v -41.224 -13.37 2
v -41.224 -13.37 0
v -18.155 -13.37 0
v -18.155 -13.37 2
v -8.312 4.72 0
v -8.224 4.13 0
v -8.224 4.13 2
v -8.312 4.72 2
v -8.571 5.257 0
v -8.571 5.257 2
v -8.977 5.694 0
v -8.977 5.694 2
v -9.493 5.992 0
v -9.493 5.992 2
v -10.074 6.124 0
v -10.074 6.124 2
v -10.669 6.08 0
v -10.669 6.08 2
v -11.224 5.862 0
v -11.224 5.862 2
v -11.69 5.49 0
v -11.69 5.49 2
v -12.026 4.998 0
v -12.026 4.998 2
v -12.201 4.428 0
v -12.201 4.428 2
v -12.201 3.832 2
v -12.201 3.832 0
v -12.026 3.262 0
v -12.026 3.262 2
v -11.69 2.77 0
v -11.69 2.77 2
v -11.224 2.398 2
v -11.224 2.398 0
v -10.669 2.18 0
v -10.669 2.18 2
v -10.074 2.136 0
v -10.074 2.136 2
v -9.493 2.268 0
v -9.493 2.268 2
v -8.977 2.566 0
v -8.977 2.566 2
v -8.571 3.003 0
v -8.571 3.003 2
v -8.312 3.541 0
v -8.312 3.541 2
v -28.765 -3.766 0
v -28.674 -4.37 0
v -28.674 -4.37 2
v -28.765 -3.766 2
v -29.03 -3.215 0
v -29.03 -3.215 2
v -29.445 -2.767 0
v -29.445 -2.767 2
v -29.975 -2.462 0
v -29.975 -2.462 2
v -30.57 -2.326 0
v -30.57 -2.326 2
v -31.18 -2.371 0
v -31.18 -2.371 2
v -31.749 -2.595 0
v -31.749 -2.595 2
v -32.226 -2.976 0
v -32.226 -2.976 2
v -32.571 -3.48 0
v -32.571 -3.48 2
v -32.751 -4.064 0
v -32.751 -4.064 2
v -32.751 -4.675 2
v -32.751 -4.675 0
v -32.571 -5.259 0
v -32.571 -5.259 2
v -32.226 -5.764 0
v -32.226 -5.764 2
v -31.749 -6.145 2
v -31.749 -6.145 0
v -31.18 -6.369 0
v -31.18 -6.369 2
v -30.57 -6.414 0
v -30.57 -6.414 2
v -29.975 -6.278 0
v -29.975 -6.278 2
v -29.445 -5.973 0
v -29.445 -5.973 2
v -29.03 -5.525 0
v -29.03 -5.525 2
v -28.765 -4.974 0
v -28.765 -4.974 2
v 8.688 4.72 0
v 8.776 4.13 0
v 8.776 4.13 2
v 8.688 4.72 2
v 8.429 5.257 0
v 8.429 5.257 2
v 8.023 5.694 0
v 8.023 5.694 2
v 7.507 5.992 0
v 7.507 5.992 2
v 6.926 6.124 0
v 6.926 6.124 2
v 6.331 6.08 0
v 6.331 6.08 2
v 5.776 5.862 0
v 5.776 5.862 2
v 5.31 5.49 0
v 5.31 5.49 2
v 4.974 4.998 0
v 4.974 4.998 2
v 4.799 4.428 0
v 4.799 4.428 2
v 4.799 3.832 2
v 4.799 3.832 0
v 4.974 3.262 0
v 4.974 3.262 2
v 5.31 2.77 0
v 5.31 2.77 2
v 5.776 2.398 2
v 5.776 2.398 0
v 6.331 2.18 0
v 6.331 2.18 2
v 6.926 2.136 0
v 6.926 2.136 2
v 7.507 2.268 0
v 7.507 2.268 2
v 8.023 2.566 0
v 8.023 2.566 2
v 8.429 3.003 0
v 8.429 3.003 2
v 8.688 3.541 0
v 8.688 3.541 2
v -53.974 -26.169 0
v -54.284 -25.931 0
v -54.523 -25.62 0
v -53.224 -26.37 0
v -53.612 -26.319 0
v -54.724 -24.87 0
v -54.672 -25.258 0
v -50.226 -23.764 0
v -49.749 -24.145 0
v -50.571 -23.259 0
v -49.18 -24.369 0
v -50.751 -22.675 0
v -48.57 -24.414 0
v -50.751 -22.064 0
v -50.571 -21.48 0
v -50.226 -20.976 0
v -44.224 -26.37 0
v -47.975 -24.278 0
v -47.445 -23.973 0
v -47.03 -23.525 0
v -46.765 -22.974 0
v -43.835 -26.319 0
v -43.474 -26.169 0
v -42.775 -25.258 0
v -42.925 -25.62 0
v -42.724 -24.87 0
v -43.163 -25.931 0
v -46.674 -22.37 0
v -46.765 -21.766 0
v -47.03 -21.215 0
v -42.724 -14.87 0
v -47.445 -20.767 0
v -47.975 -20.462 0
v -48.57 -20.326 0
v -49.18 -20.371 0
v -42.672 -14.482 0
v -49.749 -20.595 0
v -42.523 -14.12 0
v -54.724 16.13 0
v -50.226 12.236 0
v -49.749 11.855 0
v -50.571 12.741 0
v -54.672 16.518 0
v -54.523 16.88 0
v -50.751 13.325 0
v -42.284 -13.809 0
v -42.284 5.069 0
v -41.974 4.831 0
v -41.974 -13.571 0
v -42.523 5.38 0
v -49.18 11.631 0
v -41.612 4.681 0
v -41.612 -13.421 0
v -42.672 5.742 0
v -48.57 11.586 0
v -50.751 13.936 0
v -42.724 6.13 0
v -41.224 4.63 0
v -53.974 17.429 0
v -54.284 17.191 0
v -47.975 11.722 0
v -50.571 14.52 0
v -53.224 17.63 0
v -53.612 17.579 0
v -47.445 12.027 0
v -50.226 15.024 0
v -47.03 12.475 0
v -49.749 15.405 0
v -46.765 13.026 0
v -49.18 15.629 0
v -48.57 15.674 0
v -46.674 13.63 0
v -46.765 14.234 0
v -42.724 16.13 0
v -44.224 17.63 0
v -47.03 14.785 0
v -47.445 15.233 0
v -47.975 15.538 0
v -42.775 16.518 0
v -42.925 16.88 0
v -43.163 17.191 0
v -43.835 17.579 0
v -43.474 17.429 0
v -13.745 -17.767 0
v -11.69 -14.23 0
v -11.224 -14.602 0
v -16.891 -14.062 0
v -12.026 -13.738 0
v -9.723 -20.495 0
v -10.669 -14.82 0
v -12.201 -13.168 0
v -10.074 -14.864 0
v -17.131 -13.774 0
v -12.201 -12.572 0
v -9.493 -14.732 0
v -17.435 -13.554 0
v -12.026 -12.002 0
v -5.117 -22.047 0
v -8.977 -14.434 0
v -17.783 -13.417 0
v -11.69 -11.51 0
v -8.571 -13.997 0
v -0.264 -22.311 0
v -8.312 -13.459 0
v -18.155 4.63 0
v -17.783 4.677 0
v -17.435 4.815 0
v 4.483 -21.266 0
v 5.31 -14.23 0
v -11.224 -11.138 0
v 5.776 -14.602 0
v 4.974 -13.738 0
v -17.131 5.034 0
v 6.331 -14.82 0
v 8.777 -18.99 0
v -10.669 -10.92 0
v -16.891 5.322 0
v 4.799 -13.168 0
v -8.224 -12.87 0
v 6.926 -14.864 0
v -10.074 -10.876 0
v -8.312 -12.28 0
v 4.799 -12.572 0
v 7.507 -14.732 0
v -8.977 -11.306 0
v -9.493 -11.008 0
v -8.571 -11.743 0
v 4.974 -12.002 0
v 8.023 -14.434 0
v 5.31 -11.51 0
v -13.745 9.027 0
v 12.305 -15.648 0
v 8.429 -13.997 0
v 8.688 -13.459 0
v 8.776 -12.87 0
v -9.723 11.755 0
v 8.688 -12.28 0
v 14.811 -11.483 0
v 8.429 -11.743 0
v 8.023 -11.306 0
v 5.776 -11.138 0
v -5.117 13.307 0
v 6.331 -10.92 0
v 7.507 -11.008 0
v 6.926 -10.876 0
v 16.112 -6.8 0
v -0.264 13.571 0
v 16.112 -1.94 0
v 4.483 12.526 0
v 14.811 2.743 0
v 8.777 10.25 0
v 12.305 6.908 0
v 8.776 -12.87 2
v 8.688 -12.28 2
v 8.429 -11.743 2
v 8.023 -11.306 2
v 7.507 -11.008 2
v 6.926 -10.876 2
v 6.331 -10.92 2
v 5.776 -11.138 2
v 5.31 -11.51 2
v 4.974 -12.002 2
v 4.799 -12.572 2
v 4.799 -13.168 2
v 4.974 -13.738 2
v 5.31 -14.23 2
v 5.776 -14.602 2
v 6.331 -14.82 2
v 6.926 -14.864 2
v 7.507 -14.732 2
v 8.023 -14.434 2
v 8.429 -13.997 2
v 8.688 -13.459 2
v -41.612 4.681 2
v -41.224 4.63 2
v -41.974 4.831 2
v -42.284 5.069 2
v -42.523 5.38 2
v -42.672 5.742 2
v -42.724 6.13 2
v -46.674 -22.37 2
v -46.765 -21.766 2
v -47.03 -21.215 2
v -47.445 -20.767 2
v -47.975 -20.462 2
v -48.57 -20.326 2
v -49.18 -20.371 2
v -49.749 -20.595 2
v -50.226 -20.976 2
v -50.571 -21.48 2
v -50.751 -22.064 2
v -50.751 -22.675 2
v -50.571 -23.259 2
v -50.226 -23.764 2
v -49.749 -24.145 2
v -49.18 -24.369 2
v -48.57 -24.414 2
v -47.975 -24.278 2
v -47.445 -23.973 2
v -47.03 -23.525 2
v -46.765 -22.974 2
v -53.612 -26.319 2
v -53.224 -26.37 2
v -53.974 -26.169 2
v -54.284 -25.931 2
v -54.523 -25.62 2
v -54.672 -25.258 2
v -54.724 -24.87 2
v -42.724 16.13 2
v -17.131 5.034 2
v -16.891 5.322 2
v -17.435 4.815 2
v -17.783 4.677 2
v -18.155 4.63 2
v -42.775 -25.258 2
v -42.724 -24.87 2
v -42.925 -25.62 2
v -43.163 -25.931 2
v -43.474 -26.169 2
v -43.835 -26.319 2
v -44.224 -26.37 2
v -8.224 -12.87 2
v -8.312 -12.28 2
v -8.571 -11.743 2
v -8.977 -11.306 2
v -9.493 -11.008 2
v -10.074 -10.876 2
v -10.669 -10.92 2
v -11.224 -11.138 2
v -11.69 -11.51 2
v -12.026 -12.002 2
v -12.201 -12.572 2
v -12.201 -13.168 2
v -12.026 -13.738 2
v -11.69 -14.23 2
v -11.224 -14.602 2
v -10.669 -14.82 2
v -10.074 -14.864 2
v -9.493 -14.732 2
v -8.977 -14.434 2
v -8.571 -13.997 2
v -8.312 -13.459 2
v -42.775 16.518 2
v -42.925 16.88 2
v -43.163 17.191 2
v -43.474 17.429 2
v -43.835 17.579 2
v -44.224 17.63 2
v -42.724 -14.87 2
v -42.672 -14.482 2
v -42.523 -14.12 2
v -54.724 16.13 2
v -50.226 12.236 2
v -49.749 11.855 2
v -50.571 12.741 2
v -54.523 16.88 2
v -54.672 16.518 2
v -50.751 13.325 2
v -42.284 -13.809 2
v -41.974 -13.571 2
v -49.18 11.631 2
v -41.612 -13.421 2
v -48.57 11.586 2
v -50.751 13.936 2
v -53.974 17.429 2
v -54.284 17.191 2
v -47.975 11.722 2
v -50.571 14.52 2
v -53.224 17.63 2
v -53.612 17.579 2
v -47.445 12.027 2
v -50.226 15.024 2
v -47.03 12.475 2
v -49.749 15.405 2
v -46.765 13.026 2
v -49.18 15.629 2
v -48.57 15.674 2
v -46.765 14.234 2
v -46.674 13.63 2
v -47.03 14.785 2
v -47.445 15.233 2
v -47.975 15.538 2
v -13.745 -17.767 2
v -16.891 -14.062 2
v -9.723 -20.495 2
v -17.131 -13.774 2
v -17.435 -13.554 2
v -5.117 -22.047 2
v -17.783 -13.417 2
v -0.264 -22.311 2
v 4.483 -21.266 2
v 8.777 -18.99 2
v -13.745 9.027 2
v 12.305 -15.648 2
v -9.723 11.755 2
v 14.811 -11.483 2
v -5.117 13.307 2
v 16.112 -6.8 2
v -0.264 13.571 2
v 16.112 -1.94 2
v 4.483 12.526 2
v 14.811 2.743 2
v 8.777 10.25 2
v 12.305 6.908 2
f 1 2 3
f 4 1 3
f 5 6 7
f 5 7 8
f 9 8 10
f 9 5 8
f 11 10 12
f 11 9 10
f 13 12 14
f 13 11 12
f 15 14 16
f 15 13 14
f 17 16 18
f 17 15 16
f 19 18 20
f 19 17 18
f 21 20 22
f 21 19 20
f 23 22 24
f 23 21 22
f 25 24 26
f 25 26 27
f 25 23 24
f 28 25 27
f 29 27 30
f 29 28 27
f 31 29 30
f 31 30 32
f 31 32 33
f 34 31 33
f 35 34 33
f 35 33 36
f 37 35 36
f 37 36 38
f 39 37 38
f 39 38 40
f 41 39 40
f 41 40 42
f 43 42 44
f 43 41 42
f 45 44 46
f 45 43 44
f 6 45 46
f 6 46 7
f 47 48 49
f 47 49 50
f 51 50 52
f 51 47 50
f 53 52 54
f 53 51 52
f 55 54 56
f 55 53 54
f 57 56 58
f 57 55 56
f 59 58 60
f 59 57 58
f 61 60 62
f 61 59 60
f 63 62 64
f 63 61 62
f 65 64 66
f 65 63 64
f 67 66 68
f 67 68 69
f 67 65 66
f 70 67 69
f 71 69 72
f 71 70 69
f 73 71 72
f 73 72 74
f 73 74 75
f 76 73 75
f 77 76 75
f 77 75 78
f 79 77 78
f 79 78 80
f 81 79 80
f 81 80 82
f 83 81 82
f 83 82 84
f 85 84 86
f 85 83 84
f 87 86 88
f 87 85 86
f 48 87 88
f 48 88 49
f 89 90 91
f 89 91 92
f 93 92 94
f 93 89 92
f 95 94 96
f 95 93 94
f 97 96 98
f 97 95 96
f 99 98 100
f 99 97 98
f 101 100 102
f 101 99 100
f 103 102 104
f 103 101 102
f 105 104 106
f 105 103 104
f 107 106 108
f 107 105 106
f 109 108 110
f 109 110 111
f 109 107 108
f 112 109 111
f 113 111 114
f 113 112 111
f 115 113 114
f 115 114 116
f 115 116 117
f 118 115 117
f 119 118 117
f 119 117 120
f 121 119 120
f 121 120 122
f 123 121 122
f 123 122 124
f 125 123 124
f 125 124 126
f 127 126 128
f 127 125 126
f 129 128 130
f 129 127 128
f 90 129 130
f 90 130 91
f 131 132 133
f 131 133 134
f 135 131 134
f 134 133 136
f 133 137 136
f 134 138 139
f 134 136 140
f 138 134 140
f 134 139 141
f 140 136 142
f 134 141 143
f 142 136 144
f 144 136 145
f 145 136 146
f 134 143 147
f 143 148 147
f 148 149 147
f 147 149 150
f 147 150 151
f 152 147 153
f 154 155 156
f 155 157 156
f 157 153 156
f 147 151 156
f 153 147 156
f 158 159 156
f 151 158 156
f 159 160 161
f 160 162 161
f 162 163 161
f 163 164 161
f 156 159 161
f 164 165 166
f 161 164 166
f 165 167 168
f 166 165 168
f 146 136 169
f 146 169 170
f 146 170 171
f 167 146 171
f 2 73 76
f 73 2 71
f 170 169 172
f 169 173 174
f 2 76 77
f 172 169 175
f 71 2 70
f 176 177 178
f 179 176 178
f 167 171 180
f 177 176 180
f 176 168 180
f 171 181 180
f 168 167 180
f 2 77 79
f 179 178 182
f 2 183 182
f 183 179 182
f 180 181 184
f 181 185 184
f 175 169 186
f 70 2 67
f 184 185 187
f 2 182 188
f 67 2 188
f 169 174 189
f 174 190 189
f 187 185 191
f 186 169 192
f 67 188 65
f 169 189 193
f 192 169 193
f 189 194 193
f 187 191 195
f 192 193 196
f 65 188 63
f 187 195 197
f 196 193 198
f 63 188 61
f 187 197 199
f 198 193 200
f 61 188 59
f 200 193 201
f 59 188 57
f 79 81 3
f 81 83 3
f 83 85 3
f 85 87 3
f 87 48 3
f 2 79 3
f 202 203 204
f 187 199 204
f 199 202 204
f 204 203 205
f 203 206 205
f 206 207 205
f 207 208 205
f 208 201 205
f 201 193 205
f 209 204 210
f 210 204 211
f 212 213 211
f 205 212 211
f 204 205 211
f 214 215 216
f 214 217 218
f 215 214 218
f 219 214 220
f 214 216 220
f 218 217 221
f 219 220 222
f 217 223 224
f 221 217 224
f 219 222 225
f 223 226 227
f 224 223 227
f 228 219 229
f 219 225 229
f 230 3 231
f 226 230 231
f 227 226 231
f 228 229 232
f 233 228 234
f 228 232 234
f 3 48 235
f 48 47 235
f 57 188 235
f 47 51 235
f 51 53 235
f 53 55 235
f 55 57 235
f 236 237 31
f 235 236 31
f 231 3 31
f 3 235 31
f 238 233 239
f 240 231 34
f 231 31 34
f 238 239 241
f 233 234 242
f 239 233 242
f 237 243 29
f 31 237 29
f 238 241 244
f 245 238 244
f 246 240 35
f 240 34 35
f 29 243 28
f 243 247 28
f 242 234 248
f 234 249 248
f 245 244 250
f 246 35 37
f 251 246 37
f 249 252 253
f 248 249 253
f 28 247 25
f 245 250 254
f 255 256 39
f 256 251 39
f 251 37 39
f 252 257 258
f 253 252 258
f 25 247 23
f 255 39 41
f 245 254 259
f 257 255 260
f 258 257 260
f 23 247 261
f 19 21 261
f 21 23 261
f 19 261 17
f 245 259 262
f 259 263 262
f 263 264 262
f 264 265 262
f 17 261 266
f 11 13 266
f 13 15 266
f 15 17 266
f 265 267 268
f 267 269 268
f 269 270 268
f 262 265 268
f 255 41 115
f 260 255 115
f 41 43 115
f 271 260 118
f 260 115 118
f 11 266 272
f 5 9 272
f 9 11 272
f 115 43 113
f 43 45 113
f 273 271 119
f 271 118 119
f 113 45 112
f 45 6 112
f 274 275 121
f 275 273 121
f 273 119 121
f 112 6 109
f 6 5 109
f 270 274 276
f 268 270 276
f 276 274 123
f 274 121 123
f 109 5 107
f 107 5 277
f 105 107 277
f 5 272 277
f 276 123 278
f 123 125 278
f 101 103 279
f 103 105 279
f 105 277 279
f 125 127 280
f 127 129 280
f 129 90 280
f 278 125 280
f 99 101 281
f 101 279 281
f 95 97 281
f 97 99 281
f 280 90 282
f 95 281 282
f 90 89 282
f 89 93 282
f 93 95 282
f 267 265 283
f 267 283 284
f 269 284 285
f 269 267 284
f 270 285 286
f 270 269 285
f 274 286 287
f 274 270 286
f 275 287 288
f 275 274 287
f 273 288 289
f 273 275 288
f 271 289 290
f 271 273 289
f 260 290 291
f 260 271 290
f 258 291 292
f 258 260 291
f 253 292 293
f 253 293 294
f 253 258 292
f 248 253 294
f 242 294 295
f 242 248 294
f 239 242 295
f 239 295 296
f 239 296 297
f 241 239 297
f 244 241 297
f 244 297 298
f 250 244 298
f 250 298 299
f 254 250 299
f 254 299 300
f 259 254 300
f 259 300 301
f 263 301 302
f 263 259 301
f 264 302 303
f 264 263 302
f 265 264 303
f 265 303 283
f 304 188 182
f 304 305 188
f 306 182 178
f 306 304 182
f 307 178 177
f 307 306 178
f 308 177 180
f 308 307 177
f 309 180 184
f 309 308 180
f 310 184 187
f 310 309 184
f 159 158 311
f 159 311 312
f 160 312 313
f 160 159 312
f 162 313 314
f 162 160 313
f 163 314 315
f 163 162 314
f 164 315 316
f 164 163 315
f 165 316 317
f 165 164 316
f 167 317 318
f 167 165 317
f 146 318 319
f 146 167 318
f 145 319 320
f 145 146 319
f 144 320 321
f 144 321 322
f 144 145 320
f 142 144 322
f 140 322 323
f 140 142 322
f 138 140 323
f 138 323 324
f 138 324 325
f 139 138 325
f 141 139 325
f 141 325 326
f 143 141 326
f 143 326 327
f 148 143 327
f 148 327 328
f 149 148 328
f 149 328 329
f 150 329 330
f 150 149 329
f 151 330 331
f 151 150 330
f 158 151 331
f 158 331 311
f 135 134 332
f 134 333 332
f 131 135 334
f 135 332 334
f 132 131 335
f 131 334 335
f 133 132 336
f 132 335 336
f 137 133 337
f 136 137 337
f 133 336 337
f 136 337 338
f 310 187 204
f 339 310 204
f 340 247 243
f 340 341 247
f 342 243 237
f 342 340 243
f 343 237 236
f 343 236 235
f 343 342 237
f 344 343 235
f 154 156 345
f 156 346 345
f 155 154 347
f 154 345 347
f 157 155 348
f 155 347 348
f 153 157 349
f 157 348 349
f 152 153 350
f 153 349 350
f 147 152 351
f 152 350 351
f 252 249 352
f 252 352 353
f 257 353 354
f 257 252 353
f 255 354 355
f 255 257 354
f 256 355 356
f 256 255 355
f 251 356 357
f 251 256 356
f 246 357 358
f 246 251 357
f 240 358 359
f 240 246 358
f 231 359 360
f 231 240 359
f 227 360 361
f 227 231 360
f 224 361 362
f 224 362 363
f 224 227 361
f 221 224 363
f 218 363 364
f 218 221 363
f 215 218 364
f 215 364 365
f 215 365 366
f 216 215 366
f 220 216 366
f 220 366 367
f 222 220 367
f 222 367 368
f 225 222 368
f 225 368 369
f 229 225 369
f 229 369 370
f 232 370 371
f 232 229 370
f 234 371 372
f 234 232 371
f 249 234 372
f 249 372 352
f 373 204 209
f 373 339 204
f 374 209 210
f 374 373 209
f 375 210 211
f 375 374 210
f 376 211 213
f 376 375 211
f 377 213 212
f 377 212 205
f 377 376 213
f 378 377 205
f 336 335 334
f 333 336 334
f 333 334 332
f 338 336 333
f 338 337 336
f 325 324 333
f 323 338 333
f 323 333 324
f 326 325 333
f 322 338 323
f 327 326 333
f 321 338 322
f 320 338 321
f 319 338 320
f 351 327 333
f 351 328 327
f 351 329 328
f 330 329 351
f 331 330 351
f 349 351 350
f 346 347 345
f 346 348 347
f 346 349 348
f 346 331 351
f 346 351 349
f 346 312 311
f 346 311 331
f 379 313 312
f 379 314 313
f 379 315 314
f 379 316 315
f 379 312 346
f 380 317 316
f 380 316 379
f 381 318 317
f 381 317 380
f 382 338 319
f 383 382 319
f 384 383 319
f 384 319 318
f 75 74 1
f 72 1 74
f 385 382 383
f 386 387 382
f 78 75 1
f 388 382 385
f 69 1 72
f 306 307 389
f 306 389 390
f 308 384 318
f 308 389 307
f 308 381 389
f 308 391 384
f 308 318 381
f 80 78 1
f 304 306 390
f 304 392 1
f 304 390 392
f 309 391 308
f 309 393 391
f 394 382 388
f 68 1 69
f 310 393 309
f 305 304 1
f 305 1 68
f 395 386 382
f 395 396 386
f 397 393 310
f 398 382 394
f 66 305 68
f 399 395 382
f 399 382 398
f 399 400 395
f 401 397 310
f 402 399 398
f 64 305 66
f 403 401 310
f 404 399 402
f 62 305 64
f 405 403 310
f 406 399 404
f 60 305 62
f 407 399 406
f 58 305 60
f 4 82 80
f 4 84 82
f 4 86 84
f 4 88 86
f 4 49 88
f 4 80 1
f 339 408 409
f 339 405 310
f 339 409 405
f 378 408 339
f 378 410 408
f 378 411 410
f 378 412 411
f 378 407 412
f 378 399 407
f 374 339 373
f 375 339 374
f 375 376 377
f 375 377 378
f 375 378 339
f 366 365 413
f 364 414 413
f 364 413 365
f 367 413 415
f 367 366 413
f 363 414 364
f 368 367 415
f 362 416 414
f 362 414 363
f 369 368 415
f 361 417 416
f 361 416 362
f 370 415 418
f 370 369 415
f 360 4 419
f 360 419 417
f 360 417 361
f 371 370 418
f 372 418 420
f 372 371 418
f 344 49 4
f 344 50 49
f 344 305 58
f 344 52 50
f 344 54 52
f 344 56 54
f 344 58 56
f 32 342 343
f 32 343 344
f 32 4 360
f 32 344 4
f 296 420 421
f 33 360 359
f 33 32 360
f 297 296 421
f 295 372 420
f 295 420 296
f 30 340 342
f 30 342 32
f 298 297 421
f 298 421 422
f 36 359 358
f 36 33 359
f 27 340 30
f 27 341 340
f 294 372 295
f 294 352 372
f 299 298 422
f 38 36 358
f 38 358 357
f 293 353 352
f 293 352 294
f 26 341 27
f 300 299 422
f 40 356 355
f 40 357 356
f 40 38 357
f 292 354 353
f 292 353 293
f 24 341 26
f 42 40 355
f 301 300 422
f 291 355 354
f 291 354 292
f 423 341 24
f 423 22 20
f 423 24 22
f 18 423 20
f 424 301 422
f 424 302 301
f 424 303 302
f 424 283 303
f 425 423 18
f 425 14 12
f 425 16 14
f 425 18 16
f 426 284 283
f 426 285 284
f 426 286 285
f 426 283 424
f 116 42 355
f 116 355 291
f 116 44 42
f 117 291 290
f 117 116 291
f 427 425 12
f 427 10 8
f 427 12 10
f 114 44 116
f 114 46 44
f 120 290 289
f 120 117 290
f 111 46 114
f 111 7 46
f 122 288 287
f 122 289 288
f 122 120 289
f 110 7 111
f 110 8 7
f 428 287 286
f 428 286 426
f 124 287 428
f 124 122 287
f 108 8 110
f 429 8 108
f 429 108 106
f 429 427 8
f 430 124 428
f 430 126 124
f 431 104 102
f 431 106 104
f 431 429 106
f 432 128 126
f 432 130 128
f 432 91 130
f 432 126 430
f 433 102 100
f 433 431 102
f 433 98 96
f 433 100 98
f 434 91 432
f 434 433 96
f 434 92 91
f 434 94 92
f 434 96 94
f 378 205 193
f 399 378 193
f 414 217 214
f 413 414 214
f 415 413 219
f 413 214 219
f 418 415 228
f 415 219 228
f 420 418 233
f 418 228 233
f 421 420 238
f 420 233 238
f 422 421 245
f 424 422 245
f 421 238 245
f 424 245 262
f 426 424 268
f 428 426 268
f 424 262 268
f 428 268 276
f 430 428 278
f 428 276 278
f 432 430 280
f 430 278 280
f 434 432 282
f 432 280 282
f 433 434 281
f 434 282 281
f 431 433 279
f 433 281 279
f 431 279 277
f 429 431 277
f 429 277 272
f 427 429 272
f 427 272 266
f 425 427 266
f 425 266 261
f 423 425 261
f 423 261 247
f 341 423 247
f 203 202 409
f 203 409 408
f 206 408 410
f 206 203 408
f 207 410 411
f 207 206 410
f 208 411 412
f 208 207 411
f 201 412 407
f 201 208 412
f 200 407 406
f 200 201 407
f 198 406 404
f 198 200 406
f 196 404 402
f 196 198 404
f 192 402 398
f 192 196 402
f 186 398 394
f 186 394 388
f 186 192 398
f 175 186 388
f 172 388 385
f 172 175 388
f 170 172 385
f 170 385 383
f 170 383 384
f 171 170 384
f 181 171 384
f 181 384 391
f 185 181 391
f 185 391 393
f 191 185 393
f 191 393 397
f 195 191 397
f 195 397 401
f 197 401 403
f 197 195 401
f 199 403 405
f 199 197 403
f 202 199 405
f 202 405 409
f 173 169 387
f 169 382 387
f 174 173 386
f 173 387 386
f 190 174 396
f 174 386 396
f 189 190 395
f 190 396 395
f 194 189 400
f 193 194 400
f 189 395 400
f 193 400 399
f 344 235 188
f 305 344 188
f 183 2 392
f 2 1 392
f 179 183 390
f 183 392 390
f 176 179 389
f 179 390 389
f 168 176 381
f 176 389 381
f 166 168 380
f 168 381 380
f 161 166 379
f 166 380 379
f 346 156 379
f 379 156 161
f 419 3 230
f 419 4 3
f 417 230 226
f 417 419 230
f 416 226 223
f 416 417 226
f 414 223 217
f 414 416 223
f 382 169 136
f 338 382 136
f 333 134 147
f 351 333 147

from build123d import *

# Parameters (mm, degrees)
SKETCH_1_R      = 2.05
SKETCH_1_R_2    = 2
EXTRUDE_1_DEPTH = 2
FILLET_1_R      = 1.5


with BuildPart() as part:
    # 草图1 → 凸台-拉伸1 (new body)
    with BuildSketch(Plane.XY):
        with BuildLine():
            Line((-42.723571429, -13.369911995), (-17.312028697, -13.369911995))
            ThreePointArc((-17.312028697, -13.369911995), (16.276428571, -4.369911995), (-17.312028697, 4.630088005))
            Line((-17.312028697, 4.630088005), (-42.723571429, 4.630088005))
            Line((-42.723571429, 4.630088005), (-42.723571429, 17.630088005))
            Line((-42.723571429, 17.630088005), (-54.723571429, 17.630088005))
            Line((-54.723571429, 17.630088005), (-54.723571429, -26.369911995))
            Line((-54.723571429, -26.369911995), (-42.723571429, -26.369911995))
            Line((-42.723571429, -26.369911995), (-42.723571429, -13.369911995))
        make_face()
        with Locations((-30.723571429, -4.369911995)):
            Circle(SKETCH_1_R, mode=Mode.SUBTRACT)
        with Locations((-48.723571429, 13.630088005)):
            Circle(SKETCH_1_R, mode=Mode.SUBTRACT)
        with Locations((-48.723571429, -22.369911995)):
            Circle(SKETCH_1_R, mode=Mode.SUBTRACT)
        with Locations((6.776428571, -12.869911995)):
            Circle(SKETCH_1_R_2, mode=Mode.SUBTRACT)
        with Locations((-10.223571429, -12.869911995)):
            Circle(SKETCH_1_R_2, mode=Mode.SUBTRACT)
        with Locations((-10.223571429, 4.130088005)):
            Circle(SKETCH_1_R_2, mode=Mode.SUBTRACT)
        with Locations((6.776428571, 4.130088005)):
            Circle(SKETCH_1_R_2, mode=Mode.SUBTRACT)
    extrude(amount=EXTRUDE_1_DEPTH)

    # 圆角1
    fillet_1_edges = [part.edges().sort_by_distance(p)[0] for p in [
        (-42.723571429, -13.369911995, 1),
        (-42.723571429, -26.369911995, 1),
        (-54.723571429, -26.369911995, 1),
        (-54.723571429, 17.630088005, 1),
        (-42.723571429, 17.630088005, 1),
        (-42.723571429, 4.630088005, 1),
        (-17.312028697, 4.630088005, 1),
        (-17.312028697, -13.369911995, 1),
    ]]
    fillet(fillet_1_edges, radius=FILLET_1_R)


solid = part.part
